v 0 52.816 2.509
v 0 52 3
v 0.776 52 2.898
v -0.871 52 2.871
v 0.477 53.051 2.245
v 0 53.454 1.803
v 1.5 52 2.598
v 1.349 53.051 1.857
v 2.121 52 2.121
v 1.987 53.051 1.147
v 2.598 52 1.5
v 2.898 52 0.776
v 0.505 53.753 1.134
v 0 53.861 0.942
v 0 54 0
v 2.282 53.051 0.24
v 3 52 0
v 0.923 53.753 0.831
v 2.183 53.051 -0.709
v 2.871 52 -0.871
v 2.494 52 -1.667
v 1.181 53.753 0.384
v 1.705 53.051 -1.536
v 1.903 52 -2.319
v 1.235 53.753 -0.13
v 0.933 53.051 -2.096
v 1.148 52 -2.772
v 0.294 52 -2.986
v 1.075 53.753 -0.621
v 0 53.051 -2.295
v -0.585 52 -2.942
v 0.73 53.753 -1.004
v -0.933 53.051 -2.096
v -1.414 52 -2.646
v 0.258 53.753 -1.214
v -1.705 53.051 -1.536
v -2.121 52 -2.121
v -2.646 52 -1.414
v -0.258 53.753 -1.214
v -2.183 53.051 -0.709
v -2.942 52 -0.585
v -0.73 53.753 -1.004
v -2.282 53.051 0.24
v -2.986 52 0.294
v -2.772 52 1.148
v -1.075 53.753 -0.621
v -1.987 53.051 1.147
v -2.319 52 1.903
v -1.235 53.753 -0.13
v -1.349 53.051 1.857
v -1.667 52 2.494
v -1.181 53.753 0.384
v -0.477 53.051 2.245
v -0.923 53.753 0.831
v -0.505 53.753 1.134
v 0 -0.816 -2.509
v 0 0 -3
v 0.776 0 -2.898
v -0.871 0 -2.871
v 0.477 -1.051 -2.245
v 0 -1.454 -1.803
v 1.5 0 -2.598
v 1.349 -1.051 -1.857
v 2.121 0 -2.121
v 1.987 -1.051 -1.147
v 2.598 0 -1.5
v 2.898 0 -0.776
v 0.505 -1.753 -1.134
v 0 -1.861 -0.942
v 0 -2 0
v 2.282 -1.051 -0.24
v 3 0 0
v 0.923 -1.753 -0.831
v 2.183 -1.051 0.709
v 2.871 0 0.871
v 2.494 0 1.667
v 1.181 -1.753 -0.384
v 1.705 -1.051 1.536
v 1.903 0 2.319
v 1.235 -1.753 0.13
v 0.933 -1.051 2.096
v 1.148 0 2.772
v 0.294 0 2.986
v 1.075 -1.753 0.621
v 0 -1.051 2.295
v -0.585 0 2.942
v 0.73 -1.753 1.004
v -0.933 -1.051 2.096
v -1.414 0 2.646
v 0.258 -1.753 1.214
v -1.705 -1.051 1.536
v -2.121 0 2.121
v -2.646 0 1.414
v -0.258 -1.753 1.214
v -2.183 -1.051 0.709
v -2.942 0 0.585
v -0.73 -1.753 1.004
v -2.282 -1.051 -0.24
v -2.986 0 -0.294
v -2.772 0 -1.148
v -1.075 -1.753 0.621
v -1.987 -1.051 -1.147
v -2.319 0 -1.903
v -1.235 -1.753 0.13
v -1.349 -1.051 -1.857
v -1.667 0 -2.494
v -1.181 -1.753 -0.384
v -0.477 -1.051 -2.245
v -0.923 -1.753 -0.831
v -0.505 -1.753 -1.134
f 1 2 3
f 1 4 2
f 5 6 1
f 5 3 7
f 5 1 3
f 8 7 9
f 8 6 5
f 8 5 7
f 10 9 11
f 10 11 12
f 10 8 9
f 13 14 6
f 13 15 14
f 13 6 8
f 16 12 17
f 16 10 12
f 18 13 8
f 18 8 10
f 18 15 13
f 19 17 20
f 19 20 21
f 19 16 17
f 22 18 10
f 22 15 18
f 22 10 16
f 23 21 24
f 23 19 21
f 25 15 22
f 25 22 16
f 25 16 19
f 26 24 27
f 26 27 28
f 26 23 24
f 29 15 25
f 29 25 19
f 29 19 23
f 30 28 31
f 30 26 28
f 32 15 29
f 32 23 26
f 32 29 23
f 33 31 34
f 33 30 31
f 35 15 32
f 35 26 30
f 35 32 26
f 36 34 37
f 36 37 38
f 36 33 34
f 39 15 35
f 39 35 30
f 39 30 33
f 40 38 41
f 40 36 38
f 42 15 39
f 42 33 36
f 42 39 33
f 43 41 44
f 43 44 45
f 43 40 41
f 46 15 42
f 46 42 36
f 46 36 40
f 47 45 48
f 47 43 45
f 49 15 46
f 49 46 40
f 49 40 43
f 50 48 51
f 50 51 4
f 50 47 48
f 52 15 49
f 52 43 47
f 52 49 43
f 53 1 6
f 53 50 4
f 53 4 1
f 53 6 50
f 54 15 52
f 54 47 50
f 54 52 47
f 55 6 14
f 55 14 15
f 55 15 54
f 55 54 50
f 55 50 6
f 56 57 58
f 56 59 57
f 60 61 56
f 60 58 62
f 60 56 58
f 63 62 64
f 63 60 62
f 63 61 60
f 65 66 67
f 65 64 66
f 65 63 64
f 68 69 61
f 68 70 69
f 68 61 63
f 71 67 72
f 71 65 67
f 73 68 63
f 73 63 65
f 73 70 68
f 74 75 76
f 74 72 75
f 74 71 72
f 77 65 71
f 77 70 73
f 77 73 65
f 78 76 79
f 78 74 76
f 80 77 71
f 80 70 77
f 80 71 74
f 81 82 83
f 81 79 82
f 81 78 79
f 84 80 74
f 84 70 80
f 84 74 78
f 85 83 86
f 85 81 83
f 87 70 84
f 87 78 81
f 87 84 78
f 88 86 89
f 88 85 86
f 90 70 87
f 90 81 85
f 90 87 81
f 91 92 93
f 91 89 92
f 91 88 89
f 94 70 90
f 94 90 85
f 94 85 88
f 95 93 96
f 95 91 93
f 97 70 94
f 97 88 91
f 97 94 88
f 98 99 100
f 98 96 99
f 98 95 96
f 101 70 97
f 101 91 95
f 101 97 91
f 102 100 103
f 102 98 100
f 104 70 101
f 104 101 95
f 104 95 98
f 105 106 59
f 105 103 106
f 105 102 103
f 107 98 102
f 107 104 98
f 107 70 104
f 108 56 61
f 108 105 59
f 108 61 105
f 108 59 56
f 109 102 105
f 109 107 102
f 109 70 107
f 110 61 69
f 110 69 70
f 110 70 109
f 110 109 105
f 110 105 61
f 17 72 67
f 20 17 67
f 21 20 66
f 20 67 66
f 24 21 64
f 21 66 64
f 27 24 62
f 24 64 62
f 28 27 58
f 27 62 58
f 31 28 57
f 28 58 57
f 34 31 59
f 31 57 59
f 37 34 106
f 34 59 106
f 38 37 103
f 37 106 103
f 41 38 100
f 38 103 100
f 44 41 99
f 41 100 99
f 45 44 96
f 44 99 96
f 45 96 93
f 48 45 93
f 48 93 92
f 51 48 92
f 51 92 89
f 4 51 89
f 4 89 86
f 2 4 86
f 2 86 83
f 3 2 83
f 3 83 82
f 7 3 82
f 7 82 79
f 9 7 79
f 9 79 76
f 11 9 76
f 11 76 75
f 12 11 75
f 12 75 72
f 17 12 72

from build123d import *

# Parameters (mm, degrees)
SKETCH1_R           = 3
BOSS_EXTRUDE1_DEPTH = 52
DOME1_FACE_RADIUS   = 3
DOME1_HEIGHT        = 2
DOME2_FACE_RADIUS   = 3
DOME2_HEIGHT        = 2


with BuildPart() as part:
    # Sketch1 → Boss-Extrude1 (new body)
    with BuildSketch(Plane(origin=(0, 0, 0), x_dir=(1, 0, 0), z_dir=(0, 1, 0))):
        Circle(SKETCH1_R)
    extrude(amount=BOSS_EXTRUDE1_DEPTH)

    # Dome1: a dome of height H over a round flat face of radius A is a cap of a sphere of radius (A * A + H * H) / (2 * H)
    dome1_r = (DOME1_FACE_RADIUS * DOME1_FACE_RADIUS + DOME1_HEIGHT * DOME1_HEIGHT) / (2 * DOME1_HEIGHT)
    dome1_base = Plane((0, 52, 0), z_dir=(0, 1, 0))
    with Locations(dome1_base.offset(DOME1_HEIGHT - dome1_r)):
        dome1_ball = Sphere(dome1_r, mode=Mode.PRIVATE)
    add(split(dome1_ball, bisect_by=dome1_base, keep=Keep.TOP, mode=Mode.PRIVATE))

    # Dome2: a dome of height H over a round flat face of radius A is a cap of a sphere of radius (A * A + H * H) / (2 * H)
    dome2_r = (DOME2_FACE_RADIUS * DOME2_FACE_RADIUS + DOME2_HEIGHT * DOME2_HEIGHT) / (2 * DOME2_HEIGHT)
    dome2_base = Plane((0, 0, 0), z_dir=(0, -1, 0))
    with Locations(dome2_base.offset(DOME2_HEIGHT - dome2_r)):
        dome2_ball = Sphere(dome2_r, mode=Mode.PRIVATE)
    add(split(dome2_ball, bisect_by=dome2_base, keep=Keep.TOP, mode=Mode.PRIVATE))


solid = part.part
